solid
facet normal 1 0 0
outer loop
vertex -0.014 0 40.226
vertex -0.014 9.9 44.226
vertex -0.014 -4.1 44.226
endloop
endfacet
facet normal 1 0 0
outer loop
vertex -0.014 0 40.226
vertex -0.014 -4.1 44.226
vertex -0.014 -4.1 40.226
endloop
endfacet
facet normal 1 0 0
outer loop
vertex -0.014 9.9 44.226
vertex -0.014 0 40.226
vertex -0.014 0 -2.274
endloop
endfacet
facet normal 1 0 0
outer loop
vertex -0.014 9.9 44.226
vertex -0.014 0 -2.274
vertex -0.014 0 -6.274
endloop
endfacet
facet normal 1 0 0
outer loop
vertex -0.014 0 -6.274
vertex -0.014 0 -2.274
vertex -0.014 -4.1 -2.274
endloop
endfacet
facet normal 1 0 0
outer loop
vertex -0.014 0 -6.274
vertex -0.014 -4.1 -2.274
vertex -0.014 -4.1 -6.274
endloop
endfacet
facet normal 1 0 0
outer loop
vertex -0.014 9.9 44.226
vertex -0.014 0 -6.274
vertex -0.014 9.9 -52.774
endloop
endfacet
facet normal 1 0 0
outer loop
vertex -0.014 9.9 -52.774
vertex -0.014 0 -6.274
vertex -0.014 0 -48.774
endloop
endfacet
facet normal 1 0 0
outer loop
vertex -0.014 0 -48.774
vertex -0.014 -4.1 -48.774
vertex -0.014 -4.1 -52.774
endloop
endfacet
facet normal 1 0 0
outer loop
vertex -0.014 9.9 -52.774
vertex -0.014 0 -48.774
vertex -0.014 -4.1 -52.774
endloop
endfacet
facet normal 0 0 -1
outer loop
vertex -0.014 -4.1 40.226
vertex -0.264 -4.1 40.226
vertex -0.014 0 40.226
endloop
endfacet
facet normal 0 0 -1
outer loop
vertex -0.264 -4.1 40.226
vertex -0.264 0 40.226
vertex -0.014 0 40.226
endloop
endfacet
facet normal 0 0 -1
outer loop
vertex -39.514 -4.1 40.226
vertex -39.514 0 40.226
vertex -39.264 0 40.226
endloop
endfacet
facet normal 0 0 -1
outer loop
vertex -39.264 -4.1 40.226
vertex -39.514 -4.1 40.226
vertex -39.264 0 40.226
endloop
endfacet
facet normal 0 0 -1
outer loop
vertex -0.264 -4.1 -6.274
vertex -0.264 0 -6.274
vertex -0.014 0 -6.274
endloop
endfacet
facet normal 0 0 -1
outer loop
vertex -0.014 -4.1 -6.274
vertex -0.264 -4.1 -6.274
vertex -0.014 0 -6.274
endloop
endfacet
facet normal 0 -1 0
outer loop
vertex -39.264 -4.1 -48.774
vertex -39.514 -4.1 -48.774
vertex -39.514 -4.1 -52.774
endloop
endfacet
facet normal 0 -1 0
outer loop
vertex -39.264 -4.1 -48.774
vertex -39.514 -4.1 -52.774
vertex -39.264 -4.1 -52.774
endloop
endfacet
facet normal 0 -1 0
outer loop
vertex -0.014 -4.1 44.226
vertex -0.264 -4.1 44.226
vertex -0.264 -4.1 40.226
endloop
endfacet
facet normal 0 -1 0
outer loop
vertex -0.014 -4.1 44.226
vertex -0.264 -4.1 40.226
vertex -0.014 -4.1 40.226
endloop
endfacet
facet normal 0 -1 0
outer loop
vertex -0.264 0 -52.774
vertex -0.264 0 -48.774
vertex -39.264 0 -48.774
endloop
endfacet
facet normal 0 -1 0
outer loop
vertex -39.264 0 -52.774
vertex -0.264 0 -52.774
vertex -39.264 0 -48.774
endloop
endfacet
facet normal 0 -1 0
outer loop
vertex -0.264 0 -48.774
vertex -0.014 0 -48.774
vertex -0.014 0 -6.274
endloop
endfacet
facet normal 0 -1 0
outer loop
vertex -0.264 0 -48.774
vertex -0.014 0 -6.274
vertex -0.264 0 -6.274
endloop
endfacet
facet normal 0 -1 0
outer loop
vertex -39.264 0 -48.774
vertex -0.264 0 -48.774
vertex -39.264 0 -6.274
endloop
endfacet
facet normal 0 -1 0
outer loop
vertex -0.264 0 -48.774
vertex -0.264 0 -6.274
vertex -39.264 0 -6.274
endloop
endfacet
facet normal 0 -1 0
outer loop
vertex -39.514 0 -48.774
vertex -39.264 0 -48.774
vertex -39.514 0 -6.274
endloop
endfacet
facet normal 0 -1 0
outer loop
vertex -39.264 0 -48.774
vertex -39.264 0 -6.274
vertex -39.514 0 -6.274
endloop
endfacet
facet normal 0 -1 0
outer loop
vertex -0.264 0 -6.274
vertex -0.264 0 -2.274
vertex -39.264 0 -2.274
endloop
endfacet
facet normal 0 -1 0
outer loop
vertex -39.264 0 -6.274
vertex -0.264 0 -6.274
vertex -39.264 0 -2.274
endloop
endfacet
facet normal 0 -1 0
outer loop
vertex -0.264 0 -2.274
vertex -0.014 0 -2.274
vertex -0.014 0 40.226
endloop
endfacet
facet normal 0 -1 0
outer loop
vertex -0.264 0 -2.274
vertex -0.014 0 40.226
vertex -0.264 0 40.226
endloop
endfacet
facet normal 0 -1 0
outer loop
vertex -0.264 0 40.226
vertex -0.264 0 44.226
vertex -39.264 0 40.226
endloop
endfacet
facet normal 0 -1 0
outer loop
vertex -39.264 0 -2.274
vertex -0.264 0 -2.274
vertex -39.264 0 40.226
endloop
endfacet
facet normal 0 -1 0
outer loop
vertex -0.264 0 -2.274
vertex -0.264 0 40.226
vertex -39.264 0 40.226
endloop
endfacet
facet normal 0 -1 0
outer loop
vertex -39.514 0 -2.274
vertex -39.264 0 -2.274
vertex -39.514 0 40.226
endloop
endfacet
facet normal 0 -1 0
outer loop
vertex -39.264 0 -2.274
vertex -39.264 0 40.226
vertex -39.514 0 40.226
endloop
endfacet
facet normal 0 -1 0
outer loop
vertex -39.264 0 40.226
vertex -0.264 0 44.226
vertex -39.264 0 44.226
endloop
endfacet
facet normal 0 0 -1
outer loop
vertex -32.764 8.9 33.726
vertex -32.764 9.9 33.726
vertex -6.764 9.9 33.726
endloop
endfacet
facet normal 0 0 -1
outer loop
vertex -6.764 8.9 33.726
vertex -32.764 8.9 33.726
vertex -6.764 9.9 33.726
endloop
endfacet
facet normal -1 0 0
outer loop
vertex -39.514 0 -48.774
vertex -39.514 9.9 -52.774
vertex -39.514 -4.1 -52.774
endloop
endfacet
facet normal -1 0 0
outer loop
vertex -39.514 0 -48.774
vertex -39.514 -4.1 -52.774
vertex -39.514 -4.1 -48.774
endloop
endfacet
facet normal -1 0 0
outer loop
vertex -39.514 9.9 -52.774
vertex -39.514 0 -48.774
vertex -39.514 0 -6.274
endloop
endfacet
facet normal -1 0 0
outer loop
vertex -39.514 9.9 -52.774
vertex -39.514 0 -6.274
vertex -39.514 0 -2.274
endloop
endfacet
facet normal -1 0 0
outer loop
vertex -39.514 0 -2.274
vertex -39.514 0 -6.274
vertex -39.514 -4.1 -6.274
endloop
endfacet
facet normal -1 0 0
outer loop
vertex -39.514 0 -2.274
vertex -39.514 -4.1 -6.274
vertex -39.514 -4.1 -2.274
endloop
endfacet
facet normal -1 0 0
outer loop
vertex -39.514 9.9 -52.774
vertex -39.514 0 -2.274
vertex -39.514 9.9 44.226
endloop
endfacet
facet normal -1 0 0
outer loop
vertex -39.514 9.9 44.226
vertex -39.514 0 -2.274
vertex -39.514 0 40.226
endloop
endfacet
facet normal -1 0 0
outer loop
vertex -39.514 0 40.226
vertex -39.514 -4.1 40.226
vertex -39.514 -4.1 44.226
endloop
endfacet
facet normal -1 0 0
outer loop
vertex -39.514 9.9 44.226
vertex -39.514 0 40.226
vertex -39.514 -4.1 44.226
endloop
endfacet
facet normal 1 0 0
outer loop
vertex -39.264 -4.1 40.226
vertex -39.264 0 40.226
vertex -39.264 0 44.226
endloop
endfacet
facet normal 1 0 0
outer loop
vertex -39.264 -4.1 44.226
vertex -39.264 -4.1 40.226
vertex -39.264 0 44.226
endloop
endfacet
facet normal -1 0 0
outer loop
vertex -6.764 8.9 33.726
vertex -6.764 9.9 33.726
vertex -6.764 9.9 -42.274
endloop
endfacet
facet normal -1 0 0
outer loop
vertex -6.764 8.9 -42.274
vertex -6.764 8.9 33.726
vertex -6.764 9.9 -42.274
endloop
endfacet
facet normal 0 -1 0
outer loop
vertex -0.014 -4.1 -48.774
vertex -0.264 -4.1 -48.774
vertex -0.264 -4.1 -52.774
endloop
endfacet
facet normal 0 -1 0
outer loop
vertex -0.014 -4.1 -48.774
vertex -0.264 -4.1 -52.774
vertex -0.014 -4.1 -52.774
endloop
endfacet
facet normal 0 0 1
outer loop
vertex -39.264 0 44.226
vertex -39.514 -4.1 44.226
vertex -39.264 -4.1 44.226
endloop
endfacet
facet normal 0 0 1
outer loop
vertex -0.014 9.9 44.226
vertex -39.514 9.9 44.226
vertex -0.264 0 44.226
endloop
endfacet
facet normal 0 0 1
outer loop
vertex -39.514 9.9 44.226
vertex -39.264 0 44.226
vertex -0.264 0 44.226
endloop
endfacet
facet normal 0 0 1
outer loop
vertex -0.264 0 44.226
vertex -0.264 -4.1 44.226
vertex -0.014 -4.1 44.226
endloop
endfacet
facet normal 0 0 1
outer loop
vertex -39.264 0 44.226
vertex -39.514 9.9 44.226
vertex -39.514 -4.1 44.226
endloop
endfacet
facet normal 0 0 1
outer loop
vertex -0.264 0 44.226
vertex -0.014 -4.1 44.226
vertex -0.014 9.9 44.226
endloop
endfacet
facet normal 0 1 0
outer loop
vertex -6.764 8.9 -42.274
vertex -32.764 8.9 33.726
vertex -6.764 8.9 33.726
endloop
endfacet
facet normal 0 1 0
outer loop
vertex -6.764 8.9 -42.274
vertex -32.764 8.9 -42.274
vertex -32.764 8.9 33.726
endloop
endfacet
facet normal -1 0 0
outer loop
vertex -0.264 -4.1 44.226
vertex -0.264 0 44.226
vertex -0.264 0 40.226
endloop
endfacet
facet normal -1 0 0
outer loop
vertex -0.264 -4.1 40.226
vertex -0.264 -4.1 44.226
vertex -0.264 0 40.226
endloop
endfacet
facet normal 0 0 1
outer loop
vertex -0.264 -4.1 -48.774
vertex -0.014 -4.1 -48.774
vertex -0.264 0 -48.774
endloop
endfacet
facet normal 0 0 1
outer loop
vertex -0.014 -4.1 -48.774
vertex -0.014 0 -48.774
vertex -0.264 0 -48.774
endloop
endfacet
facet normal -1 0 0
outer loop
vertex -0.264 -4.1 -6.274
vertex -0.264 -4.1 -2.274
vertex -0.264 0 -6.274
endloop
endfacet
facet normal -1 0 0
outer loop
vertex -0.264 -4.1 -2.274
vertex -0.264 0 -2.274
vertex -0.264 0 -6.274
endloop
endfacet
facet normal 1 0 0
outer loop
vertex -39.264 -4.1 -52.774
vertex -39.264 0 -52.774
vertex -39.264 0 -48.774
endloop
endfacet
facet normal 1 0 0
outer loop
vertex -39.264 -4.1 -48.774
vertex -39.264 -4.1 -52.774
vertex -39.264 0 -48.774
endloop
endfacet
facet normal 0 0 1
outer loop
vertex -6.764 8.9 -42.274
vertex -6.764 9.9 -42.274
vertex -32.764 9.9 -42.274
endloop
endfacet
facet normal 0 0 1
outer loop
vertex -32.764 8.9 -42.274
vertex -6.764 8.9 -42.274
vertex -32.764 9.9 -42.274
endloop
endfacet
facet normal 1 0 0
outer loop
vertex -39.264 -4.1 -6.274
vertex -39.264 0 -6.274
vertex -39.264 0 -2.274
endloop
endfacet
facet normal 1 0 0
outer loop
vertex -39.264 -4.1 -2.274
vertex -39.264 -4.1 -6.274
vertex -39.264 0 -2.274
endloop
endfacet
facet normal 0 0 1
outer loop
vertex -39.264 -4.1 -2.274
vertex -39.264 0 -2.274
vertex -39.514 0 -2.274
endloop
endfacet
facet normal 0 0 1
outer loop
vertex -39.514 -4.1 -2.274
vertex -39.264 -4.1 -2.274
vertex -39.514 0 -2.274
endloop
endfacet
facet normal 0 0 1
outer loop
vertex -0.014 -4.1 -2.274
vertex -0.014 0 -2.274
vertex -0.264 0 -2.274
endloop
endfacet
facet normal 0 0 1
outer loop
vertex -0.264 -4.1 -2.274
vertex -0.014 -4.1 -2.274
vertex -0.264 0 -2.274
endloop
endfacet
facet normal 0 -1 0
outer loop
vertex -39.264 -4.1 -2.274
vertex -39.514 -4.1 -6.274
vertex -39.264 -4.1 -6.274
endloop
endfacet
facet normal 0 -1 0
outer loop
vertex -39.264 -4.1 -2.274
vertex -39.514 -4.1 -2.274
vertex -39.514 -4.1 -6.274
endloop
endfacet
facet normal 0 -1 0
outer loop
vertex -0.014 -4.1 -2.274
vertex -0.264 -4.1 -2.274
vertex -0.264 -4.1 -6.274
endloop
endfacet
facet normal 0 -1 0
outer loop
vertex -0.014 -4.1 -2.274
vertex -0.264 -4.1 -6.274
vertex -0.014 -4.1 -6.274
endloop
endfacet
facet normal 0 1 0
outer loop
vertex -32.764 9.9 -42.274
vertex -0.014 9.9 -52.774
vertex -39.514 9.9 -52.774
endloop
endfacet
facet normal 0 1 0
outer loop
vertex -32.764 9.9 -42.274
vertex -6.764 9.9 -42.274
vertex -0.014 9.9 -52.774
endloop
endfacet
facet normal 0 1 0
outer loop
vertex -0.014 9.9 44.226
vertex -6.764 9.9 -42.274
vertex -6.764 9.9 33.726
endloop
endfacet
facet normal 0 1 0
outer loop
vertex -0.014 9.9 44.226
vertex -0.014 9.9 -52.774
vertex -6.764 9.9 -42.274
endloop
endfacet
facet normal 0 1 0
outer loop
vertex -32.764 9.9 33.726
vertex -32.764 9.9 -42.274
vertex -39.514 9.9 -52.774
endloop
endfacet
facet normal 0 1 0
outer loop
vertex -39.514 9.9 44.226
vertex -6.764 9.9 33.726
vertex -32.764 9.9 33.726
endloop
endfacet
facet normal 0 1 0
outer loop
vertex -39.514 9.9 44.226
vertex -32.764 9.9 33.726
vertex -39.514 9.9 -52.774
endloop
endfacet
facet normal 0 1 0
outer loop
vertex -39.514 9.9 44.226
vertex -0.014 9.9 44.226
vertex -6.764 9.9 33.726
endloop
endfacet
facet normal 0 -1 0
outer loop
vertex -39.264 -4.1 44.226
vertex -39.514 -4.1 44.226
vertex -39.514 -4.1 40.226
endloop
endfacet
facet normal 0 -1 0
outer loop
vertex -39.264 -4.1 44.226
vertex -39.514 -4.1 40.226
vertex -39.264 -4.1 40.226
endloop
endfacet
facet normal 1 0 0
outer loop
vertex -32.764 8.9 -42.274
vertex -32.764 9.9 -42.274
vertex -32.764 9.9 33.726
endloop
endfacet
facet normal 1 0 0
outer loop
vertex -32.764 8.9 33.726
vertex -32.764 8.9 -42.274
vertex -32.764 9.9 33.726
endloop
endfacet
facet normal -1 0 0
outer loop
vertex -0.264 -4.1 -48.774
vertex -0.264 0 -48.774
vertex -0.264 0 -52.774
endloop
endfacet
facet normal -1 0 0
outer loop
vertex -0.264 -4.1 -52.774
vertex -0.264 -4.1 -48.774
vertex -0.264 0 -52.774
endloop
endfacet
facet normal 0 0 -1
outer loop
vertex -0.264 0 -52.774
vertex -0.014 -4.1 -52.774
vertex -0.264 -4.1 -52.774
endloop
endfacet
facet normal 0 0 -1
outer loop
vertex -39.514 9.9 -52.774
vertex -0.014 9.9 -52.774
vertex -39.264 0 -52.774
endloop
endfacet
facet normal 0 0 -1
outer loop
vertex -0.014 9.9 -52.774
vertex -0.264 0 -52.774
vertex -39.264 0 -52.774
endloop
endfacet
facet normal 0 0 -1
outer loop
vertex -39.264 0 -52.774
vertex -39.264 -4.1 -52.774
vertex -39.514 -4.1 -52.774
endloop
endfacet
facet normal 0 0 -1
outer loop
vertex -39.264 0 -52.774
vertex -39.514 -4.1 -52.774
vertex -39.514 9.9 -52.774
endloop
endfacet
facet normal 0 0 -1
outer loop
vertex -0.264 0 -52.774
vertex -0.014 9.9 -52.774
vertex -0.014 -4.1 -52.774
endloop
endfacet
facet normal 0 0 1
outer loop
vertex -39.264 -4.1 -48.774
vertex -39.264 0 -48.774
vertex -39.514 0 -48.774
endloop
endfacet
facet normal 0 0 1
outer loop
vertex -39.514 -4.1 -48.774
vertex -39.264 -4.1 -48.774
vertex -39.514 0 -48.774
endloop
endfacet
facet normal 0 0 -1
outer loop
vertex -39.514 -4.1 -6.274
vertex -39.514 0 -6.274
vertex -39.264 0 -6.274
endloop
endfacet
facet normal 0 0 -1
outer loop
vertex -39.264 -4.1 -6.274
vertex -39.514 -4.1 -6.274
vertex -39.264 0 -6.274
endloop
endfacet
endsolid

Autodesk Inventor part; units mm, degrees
ref_plane "YZ Plane" through (0, 0, 0) normal (1, 0, 0) x (0, 1, 0)
ref_plane "XZ Plane" through (0, 0, 0) normal (0, 1, 0) x (-1, 0, 0)
ref_plane "XY Plane" through (0, 0, 0) normal (0, 0, 1) x (1, 0, 0)
sketch "Sketch1" plane through (0, 0, 0) normal (0, 1, 0) x (-1, 0, 0)
  line L0 (39.5135, 44.2255) -> (0.0135, 44.2255)
  line L1 (0.0135, 44.2255) -> (0.0135, -52.7745)
  line L2 (0.0135, -52.7745) -> (39.5135, -52.7745)
  line L3 (39.5135, -52.7745) -> (39.5135, 44.2255)
  point P0 (0, 0)
  dimension "LCD_Screen_Width" = 97
  dimension "LCD_Screen_Height" = 39.5
extrude "Extrusion1" add sketch "Sketch1" along normal blind 9.9
sketch "Sketch2" plane through (0, 9.9, 0) normal (0, 1, 0) x (1, 0, 0)
  line L0 (-32.7635, -33.7255) -> (-6.7635, -33.7255)
  line L1 (-6.7635, -33.7255) -> (-6.7635, 42.2745)
  line L2 (-6.7635, 42.2745) -> (-32.7635, 42.2745)
  line L3 (-32.7635, 42.2745) -> (-32.7635, -33.7255)
  line L4 (-39.5135, 52.7745) -> (-39.5135, -44.2255) construction
  line L5 (-39.5135, 4.2745) -> (-32.7635, 4.2745) construction
  line L6 (-6.7635, 4.2745) -> (-0.0135, 4.2745) construction
  line L7 (-0.0135, -44.2255) -> (-0.0135, 52.7745) construction
  point P0 (0, 0)
  dimension "LCD_Viewable_Height" = 26
  dimension "LCD_Viewable_Width" = 76
extrude "Extrusion2" cut sketch "Sketch2" against normal blind 1
sketch "Sketch3" plane through (0, 0, 0) normal (0, -1, 0) x (1, 0, 0)
  line L0 (-0.0135, 44.2255) -> (-0.2635, 44.2255)
  line L1 (-0.2635, 44.2255) -> (-0.2635, 40.2255)
  line L2 (-0.2635, 40.2255) -> (-0.0135, 40.2255)
  line L3 (-0.0135, 40.2255) -> (-0.0135, 44.2255)
  line L4 (-0.0135, -2.2745) -> (-0.2635, -2.2745)
  line L5 (-0.2635, -2.2745) -> (-0.2635, -6.2745)
  line L6 (-0.2635, -6.2745) -> (-0.0135, -6.2745)
  line L7 (-0.0135, -6.2745) -> (-0.0135, -2.2745)
  line L8 (-0.0135, -48.7745) -> (-0.2635, -48.7745)
  line L9 (-0.2635, -48.7745) -> (-0.2635, -52.7745)
  line L10 (-0.2635, -52.7745) -> (-0.0135, -52.7745)
  line L11 (-0.0135, -52.7745) -> (-0.0135, -48.7745)
  line L12 (-39.2635, -48.7745) -> (-39.5135, -48.7745)
  line L13 (-39.5135, -48.7745) -> (-39.5135, -52.7745)
  line L14 (-39.5135, -52.7745) -> (-39.2635, -52.7745)
  line L15 (-39.2635, -52.7745) -> (-39.2635, -48.7745)
  line L16 (-39.2635, -2.2745) -> (-39.5135, -2.2745)
  line L17 (-39.5135, -2.2745) -> (-39.5135, -6.2745)
  line L18 (-39.5135, -6.2745) -> (-39.2635, -6.2745)
  line L19 (-39.2635, -6.2745) -> (-39.2635, -2.2745)
  line L20 (-39.2635, 44.2255) -> (-39.5135, 44.2255)
  line L21 (-39.5135, 44.2255) -> (-39.5135, 40.2255)
  line L22 (-39.5135, 40.2255) -> (-39.2635, 40.2255)
  line L23 (-39.2635, 40.2255) -> (-39.2635, 44.2255)
  line L24 (-0.0135, 44.2255) -> (-0.0135, -52.7745) projected
  line L25 (-39.5135, -52.7745) -> (-39.5135, 44.2255) projected
  line L26 (-39.5135, 44.2255) -> (-0.0135, 44.2255) projected
  line L27 (-0.0135, -52.7745) -> (-39.5135, -52.7745) projected
  line L28 (-0.2635, 40.2255) -> (-0.2635, -2.2745) construction
  line L29 (-0.2635, -6.2745) -> (-0.2635, -48.7745) construction
  point P0 (0, 0)
  dimension "LCD_Screen_Tab_Width" = 0.25
  dimension "LCD_Screen_Tab_Length" = 4
extrude "Extrusion3" add sketch "Sketch3" along normal blind 4.1 contours L3 L2 L1 L0 | L23 L22 L21 L20 | L7 L6 L5 L4 | L11 L10 L9 L8 | L16 L19 L18 L17 | L12 L15 L14 L13
properties part number "LCD_Screen" material "Steel, Mild"
